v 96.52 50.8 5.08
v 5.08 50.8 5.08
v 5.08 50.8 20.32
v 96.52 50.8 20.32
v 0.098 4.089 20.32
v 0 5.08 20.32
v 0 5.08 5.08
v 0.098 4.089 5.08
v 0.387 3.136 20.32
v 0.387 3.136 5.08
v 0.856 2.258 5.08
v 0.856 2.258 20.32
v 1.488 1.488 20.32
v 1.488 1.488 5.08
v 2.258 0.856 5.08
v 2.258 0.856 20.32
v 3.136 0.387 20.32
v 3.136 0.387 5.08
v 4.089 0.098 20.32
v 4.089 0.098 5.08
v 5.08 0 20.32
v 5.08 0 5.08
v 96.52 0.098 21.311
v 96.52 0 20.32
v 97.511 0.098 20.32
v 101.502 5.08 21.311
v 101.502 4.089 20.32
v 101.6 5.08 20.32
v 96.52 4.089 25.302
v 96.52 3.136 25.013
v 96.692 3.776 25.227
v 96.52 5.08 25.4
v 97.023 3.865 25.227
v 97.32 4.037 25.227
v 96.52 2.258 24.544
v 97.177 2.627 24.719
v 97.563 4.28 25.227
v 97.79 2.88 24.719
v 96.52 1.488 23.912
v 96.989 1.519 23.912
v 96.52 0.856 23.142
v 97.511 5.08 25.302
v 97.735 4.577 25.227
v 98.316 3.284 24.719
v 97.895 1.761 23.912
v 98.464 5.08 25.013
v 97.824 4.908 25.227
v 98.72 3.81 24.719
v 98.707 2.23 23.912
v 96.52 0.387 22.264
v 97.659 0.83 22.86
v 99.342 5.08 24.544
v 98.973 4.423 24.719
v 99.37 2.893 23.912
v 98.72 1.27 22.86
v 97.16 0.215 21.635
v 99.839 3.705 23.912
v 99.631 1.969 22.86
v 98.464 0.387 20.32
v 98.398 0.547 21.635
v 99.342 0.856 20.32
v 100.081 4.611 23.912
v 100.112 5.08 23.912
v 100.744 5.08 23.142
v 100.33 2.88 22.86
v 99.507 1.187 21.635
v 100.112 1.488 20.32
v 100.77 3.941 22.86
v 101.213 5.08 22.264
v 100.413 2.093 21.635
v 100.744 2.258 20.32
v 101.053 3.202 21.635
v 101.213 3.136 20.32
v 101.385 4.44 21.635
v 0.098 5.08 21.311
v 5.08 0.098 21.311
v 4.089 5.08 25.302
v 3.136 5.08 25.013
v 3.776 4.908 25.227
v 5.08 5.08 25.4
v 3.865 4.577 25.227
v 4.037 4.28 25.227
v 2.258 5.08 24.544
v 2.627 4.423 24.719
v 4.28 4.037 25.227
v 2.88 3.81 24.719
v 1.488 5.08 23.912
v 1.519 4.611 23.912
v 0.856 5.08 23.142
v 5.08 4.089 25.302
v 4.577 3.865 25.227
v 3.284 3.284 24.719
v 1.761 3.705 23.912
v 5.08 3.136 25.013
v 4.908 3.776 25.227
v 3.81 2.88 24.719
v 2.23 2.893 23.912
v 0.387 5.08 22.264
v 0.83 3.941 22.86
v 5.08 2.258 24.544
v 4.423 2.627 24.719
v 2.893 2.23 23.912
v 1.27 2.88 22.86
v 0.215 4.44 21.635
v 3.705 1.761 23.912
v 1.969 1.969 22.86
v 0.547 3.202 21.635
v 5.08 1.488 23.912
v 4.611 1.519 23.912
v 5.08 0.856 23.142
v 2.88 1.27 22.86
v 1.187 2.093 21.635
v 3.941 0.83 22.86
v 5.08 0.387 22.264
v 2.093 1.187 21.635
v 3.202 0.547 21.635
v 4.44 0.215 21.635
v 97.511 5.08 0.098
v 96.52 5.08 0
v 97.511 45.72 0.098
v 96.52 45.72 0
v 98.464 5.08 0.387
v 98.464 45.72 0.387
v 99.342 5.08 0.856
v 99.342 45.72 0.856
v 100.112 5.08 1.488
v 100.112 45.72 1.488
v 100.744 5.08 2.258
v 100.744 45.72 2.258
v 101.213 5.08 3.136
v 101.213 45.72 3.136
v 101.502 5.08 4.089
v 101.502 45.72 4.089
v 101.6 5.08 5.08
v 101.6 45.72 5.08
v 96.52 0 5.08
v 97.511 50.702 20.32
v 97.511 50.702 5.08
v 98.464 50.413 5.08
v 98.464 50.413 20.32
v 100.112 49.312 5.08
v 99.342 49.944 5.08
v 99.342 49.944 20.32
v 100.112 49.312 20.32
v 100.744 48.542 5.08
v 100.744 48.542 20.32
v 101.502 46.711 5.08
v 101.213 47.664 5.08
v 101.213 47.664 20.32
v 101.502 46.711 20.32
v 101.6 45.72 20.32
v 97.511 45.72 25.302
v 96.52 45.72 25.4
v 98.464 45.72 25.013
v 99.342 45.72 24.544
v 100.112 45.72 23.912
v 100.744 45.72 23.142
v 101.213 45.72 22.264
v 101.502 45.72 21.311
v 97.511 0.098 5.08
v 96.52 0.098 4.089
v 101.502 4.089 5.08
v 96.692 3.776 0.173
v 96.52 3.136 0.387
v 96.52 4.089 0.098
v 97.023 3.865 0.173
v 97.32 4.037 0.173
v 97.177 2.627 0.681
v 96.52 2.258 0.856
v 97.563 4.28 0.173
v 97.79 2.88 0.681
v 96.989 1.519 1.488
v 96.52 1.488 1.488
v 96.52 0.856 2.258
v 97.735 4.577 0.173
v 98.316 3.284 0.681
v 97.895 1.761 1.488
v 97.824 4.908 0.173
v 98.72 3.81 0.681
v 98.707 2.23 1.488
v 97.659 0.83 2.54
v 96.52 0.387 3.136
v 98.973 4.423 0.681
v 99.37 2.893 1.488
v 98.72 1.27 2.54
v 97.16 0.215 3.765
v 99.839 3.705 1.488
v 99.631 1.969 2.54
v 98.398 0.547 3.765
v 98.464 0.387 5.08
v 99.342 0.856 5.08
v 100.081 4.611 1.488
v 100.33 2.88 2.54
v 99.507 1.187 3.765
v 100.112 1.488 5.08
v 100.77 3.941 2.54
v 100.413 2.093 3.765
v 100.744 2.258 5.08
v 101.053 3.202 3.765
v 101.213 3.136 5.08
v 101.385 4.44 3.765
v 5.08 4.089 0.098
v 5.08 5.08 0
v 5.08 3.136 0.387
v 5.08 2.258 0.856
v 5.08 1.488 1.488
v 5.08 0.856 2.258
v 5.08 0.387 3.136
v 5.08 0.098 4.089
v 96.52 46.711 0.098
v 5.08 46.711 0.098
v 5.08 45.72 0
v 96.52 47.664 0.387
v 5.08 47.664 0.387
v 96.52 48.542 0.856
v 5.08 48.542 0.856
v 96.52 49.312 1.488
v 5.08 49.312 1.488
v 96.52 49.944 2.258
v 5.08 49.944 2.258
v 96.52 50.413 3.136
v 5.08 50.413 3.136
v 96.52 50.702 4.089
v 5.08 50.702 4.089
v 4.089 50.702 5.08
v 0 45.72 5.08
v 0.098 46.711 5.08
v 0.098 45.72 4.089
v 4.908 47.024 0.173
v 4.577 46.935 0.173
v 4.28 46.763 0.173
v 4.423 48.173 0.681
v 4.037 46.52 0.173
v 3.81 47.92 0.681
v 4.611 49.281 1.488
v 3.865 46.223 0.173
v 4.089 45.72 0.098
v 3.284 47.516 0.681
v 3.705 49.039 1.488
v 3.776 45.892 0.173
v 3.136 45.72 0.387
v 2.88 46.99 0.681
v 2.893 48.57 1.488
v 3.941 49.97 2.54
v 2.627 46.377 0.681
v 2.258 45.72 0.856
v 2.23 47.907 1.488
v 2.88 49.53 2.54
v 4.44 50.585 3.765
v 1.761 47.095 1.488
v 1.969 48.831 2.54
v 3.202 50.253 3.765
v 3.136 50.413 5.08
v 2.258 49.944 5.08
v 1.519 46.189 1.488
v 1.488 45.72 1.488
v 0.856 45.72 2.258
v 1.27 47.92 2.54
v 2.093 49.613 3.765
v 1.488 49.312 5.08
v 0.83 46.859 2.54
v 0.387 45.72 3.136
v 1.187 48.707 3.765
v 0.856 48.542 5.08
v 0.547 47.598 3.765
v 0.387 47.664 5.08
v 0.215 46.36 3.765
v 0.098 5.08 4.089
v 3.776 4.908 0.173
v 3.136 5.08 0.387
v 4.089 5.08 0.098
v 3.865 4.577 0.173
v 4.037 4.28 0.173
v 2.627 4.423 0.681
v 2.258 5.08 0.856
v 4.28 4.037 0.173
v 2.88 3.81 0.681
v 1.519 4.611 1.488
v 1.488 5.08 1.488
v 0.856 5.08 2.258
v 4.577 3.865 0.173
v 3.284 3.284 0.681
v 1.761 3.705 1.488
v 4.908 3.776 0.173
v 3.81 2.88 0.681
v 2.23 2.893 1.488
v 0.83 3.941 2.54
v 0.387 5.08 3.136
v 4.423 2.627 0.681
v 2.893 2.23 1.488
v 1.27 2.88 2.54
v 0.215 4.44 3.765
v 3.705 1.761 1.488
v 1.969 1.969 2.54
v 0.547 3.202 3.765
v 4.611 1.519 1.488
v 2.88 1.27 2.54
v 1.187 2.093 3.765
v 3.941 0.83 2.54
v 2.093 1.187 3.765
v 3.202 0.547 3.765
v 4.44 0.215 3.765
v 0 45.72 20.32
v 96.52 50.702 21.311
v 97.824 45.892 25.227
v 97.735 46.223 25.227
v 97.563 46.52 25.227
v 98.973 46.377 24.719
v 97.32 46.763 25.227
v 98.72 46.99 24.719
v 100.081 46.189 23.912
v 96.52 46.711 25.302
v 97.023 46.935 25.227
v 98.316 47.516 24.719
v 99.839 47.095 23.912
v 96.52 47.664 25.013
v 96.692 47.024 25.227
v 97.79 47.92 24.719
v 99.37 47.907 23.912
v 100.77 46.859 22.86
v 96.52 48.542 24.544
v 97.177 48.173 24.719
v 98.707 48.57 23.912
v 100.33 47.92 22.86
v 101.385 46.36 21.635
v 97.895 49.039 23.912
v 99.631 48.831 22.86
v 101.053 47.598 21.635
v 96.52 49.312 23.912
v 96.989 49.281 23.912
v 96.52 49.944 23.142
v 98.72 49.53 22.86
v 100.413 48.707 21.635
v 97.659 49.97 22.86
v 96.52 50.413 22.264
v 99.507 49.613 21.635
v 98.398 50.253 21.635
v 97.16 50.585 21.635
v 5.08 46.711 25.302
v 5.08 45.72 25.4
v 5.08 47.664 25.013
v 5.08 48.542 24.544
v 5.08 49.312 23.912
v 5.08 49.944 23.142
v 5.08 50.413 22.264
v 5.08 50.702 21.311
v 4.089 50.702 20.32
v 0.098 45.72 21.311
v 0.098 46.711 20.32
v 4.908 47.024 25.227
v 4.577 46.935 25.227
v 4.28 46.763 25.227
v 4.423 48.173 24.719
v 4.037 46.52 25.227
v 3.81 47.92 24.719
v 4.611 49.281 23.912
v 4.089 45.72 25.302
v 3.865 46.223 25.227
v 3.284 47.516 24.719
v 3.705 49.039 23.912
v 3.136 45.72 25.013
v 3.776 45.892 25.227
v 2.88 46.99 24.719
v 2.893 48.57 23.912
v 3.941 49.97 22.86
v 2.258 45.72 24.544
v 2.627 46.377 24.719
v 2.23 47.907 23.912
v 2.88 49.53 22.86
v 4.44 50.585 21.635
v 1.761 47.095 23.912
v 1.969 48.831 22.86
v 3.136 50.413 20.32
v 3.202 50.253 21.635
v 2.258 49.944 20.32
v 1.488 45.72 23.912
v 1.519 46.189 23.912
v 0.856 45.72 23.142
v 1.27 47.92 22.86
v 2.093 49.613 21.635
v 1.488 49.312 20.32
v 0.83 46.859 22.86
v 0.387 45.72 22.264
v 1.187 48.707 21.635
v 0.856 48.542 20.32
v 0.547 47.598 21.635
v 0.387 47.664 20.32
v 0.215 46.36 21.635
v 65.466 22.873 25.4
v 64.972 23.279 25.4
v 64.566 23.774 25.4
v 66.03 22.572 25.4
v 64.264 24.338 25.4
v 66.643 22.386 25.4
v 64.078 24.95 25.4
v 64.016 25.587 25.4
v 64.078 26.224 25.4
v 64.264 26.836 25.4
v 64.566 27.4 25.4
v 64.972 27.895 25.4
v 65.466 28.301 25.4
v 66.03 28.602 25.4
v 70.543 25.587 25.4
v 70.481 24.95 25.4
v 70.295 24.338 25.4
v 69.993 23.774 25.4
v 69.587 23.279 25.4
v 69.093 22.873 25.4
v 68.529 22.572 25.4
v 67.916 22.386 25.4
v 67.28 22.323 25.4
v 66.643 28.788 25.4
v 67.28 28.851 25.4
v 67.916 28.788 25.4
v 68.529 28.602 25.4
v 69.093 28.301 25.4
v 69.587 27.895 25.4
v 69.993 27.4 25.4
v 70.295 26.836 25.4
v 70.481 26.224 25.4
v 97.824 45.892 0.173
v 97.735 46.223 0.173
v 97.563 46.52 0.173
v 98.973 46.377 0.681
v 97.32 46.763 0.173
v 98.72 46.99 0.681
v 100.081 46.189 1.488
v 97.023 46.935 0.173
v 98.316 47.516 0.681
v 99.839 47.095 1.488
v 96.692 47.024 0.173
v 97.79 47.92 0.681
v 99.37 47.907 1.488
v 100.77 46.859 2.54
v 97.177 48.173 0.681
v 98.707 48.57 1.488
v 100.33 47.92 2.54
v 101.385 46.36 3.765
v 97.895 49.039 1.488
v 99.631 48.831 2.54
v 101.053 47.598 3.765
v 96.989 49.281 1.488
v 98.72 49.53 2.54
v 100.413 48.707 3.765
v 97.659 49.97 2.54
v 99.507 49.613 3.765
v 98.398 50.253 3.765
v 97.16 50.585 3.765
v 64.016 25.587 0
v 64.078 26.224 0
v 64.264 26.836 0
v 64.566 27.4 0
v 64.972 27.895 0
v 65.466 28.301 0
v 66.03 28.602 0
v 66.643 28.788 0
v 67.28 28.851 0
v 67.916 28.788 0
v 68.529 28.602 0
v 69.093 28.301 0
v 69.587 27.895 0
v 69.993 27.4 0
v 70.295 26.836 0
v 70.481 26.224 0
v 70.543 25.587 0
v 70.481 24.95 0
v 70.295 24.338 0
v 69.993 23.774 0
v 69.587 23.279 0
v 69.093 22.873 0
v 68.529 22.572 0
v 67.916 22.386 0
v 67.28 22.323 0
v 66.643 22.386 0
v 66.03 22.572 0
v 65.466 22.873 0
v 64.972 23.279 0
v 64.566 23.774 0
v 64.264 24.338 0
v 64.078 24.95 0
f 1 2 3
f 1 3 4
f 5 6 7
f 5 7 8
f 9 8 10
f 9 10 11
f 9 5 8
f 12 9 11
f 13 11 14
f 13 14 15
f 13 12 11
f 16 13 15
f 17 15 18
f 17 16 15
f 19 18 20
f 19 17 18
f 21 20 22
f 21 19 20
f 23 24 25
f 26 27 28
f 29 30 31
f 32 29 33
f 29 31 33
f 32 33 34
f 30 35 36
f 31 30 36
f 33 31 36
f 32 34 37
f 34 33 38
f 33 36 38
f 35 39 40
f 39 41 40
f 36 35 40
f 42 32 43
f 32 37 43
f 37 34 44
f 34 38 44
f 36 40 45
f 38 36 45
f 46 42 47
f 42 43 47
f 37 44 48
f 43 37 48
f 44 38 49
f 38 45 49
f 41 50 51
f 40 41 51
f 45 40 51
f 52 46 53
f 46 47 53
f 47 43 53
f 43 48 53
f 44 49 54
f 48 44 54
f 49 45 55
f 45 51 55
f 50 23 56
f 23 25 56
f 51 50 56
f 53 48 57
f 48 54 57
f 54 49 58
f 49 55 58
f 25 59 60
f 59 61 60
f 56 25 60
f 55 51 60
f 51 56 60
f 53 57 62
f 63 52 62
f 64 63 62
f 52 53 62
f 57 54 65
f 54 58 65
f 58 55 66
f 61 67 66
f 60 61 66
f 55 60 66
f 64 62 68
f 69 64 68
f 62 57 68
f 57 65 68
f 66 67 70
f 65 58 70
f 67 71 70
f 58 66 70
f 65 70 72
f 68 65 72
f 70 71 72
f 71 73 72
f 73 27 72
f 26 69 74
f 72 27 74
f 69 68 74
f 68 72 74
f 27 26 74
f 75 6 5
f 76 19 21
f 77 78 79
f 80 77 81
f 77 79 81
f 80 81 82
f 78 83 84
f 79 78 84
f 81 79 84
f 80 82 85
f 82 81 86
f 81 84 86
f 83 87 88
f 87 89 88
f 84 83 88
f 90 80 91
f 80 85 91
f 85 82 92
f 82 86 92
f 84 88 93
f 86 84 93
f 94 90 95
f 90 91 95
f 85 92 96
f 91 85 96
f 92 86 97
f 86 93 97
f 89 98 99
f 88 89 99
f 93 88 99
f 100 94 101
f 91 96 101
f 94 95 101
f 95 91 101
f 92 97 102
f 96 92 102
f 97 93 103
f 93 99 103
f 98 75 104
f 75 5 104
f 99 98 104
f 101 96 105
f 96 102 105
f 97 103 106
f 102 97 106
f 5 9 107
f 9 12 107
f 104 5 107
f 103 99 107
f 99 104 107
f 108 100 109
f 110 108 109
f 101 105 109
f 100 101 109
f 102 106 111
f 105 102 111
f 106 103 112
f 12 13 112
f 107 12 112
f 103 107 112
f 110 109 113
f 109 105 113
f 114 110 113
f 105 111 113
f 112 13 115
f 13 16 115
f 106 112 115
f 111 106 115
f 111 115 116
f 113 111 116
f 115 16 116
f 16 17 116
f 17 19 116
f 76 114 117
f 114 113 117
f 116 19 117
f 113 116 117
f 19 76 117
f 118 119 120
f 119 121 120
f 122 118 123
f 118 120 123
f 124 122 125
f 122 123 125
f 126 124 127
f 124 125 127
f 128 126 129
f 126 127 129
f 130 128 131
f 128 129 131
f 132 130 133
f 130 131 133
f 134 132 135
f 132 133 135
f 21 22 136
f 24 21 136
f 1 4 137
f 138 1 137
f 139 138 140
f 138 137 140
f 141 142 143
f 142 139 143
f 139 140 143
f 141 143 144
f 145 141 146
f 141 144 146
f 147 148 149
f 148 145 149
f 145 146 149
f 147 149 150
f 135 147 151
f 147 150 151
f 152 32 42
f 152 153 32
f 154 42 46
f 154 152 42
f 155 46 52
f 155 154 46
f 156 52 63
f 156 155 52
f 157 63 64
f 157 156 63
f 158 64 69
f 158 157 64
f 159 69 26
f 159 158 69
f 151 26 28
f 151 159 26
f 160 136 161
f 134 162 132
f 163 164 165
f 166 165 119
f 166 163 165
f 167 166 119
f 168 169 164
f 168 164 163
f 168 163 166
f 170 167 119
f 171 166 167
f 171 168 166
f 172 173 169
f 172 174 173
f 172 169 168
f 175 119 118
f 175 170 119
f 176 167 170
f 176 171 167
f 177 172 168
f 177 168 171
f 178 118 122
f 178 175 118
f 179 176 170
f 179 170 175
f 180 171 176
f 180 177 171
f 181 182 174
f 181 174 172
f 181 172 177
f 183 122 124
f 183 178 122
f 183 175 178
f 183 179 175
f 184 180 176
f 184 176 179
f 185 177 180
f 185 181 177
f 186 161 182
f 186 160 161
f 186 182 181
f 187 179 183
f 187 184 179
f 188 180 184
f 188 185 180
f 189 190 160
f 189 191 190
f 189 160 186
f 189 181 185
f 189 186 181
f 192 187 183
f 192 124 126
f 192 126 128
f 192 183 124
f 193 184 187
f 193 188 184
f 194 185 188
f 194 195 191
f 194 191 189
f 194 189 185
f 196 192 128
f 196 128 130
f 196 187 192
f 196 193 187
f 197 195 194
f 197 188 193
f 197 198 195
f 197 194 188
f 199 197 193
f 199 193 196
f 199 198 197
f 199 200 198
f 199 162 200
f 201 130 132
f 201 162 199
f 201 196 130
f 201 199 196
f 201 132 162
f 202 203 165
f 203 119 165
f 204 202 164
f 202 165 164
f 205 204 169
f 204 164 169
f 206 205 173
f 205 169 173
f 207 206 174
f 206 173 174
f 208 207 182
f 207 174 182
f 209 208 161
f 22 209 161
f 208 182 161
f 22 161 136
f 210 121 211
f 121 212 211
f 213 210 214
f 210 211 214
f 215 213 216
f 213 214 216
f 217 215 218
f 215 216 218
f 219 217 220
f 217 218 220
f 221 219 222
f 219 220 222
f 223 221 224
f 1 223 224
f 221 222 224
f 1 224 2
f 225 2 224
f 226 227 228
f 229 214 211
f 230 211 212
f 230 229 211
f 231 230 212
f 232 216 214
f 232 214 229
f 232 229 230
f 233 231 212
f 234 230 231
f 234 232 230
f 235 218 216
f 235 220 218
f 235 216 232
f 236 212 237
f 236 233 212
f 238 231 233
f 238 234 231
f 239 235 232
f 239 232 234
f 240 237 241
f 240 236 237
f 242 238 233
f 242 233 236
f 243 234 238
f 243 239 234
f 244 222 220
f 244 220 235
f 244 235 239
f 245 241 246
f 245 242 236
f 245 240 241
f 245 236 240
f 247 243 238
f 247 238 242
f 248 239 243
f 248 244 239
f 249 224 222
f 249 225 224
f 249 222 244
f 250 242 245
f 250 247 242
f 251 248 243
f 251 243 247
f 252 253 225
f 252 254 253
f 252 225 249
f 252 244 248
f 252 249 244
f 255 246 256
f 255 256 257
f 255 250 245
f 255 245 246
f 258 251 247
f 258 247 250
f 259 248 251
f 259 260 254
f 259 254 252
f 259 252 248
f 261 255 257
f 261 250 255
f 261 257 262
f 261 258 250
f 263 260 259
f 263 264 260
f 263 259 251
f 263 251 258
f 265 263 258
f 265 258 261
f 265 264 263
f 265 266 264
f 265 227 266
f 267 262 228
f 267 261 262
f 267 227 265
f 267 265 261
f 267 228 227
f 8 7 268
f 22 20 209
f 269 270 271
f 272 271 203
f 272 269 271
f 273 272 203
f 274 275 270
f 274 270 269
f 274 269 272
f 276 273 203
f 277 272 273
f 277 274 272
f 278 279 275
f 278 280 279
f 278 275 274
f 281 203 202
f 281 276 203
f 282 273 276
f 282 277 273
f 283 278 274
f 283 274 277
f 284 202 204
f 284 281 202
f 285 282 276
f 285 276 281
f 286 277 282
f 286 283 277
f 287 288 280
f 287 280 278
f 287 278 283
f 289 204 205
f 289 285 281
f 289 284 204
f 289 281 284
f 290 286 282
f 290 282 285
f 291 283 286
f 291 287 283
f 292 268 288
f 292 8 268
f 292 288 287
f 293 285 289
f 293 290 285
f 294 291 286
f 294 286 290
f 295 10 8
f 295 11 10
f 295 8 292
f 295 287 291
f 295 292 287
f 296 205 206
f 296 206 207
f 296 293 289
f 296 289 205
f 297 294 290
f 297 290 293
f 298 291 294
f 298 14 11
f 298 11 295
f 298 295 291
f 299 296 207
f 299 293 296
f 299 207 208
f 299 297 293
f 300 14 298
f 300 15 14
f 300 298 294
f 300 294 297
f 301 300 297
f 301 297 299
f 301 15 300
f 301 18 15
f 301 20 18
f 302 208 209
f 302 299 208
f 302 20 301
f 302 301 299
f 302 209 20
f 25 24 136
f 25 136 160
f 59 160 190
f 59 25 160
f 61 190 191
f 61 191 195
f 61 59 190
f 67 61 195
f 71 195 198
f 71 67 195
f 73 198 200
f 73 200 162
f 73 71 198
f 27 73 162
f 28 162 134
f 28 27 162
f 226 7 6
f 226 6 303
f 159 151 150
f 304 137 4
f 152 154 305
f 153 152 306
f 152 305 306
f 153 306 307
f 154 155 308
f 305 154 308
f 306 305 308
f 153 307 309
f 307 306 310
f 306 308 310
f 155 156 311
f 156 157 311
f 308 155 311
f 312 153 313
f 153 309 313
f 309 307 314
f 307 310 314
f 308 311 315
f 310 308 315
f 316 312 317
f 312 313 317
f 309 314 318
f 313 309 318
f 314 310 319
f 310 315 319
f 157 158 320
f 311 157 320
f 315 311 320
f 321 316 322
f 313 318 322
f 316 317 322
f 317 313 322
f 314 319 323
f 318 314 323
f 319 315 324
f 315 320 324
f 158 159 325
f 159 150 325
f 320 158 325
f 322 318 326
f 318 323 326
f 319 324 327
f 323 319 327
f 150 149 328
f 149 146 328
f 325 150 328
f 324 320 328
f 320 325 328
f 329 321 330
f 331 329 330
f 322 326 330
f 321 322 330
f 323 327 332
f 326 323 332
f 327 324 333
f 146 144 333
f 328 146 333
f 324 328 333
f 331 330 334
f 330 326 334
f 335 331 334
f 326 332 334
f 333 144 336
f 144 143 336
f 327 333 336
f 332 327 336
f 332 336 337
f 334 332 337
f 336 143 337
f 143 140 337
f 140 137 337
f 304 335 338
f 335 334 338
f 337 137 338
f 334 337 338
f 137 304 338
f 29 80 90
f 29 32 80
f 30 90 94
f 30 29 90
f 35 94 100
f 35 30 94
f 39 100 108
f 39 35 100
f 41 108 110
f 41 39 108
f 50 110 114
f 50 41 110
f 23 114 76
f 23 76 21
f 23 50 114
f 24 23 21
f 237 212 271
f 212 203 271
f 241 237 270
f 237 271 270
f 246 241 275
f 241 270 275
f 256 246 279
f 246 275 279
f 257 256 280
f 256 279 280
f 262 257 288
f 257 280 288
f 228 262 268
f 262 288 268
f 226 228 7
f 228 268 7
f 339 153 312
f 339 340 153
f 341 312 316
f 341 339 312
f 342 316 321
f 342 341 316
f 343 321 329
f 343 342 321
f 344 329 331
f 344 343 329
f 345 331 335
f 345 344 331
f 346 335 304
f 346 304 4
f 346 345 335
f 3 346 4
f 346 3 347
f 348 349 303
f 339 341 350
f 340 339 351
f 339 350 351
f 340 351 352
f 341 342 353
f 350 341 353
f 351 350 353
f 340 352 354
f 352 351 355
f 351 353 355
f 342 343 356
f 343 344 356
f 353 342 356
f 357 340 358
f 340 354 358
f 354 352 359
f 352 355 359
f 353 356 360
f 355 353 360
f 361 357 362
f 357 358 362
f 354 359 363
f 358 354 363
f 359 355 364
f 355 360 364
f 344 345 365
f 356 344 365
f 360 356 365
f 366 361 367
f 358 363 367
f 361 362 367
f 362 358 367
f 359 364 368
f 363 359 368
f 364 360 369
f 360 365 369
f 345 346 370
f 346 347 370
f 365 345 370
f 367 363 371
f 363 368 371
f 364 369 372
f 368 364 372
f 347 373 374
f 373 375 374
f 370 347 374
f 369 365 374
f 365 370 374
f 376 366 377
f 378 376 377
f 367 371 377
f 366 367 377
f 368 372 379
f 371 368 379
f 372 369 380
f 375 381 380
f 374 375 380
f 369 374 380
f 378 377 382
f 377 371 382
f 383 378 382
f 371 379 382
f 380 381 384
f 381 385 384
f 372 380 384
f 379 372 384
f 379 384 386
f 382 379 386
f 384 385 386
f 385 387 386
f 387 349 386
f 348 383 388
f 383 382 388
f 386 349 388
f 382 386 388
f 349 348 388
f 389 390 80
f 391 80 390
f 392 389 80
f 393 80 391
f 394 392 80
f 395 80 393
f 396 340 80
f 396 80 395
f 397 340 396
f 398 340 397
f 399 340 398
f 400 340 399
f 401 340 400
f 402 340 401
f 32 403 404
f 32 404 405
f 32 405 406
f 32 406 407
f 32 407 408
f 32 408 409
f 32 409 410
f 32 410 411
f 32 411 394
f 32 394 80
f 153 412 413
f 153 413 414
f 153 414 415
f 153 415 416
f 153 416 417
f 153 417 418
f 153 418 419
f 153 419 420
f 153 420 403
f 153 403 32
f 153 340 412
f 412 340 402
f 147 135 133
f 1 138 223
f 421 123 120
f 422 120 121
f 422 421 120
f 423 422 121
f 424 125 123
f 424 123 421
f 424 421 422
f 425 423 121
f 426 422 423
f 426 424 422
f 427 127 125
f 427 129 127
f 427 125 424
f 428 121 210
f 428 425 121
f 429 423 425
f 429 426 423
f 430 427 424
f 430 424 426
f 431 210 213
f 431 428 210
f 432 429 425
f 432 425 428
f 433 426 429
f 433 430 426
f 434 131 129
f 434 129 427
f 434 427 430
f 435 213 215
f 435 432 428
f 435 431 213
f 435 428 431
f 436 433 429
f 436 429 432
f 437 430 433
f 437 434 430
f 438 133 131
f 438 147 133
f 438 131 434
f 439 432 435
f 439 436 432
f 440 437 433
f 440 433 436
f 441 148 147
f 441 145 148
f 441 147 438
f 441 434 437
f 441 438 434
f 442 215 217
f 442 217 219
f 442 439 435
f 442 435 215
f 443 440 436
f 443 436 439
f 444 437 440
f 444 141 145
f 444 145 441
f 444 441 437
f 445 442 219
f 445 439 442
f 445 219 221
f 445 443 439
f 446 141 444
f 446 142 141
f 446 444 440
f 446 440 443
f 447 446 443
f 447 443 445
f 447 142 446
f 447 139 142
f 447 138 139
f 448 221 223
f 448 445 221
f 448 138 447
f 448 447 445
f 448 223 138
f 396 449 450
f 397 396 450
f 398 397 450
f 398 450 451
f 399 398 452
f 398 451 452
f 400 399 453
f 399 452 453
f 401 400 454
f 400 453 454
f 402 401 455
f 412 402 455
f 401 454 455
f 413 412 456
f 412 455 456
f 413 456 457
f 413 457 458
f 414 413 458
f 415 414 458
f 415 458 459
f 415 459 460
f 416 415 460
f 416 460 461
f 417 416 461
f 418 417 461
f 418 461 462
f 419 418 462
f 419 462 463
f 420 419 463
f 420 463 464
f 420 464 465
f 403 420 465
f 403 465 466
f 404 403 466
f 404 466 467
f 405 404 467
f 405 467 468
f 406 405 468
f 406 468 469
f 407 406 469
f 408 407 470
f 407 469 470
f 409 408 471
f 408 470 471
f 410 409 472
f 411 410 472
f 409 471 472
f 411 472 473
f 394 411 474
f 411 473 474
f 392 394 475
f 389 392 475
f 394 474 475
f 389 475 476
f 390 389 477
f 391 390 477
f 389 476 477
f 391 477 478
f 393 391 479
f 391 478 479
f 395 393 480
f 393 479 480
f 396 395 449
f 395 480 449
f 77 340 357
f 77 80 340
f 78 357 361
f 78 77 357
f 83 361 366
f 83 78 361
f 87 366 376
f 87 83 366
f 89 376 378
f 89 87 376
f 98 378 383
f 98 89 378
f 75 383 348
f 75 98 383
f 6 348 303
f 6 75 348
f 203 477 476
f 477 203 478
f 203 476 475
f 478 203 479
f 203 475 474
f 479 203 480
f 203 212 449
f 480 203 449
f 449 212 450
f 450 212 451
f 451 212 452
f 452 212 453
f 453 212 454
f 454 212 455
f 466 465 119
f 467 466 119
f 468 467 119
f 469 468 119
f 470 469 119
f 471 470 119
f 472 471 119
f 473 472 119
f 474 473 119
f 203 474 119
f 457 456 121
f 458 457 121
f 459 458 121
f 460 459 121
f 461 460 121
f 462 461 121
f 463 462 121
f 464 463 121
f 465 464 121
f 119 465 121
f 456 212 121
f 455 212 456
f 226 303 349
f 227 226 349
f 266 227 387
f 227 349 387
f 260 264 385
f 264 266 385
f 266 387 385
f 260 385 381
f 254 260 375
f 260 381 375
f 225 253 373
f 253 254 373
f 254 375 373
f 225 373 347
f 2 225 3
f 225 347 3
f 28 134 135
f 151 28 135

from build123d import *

# Parameters (mm, degrees)
F0_W     = 101.6
F0_H     = 50.8
F1_DEPTH = 25.4
F3_D     = 6.5278
F4_R     = 5.08
F5_R     = 5.08
F6_R     = 5.08


with BuildPart() as f1:
    # F0 (on Top) → F1 (new body)
    with BuildSketch(Plane.XY):
        with Locations((50.8, 25.4)):
            Rectangle(F0_W, F0_H)
    extrude(amount=F1_DEPTH)

    # F3 (through all)
    with Locations(Plane.XY.offset(25.4)):
        with Locations((67.2795102, 25.5870483816)):
            Hole(F3_D / 2)

    # F4
    f4_edges = [f1.edges().sort_by_distance(p)[0] for p in [
        (101.6, 50.8, 12.7),
        (101.6, 0, 12.7),
        (0, 0, 12.7),
        (0, 50.8, 12.7),
    ]]
    fillet(f4_edges, radius=F4_R)

    # F5
    f5_edges = [f1.edges().sort_by_distance(p)[0] for p in [
        (101.6, 25.4, 25.4),
    ]]
    fillet(f5_edges, radius=F5_R)

    # F6
    f6_edges = [f1.edges().sort_by_distance(p)[0] for p in [
        (101.6, 25.4, 0),
    ]]
    fillet(f6_edges, radius=F6_R)


solid = f1.part
